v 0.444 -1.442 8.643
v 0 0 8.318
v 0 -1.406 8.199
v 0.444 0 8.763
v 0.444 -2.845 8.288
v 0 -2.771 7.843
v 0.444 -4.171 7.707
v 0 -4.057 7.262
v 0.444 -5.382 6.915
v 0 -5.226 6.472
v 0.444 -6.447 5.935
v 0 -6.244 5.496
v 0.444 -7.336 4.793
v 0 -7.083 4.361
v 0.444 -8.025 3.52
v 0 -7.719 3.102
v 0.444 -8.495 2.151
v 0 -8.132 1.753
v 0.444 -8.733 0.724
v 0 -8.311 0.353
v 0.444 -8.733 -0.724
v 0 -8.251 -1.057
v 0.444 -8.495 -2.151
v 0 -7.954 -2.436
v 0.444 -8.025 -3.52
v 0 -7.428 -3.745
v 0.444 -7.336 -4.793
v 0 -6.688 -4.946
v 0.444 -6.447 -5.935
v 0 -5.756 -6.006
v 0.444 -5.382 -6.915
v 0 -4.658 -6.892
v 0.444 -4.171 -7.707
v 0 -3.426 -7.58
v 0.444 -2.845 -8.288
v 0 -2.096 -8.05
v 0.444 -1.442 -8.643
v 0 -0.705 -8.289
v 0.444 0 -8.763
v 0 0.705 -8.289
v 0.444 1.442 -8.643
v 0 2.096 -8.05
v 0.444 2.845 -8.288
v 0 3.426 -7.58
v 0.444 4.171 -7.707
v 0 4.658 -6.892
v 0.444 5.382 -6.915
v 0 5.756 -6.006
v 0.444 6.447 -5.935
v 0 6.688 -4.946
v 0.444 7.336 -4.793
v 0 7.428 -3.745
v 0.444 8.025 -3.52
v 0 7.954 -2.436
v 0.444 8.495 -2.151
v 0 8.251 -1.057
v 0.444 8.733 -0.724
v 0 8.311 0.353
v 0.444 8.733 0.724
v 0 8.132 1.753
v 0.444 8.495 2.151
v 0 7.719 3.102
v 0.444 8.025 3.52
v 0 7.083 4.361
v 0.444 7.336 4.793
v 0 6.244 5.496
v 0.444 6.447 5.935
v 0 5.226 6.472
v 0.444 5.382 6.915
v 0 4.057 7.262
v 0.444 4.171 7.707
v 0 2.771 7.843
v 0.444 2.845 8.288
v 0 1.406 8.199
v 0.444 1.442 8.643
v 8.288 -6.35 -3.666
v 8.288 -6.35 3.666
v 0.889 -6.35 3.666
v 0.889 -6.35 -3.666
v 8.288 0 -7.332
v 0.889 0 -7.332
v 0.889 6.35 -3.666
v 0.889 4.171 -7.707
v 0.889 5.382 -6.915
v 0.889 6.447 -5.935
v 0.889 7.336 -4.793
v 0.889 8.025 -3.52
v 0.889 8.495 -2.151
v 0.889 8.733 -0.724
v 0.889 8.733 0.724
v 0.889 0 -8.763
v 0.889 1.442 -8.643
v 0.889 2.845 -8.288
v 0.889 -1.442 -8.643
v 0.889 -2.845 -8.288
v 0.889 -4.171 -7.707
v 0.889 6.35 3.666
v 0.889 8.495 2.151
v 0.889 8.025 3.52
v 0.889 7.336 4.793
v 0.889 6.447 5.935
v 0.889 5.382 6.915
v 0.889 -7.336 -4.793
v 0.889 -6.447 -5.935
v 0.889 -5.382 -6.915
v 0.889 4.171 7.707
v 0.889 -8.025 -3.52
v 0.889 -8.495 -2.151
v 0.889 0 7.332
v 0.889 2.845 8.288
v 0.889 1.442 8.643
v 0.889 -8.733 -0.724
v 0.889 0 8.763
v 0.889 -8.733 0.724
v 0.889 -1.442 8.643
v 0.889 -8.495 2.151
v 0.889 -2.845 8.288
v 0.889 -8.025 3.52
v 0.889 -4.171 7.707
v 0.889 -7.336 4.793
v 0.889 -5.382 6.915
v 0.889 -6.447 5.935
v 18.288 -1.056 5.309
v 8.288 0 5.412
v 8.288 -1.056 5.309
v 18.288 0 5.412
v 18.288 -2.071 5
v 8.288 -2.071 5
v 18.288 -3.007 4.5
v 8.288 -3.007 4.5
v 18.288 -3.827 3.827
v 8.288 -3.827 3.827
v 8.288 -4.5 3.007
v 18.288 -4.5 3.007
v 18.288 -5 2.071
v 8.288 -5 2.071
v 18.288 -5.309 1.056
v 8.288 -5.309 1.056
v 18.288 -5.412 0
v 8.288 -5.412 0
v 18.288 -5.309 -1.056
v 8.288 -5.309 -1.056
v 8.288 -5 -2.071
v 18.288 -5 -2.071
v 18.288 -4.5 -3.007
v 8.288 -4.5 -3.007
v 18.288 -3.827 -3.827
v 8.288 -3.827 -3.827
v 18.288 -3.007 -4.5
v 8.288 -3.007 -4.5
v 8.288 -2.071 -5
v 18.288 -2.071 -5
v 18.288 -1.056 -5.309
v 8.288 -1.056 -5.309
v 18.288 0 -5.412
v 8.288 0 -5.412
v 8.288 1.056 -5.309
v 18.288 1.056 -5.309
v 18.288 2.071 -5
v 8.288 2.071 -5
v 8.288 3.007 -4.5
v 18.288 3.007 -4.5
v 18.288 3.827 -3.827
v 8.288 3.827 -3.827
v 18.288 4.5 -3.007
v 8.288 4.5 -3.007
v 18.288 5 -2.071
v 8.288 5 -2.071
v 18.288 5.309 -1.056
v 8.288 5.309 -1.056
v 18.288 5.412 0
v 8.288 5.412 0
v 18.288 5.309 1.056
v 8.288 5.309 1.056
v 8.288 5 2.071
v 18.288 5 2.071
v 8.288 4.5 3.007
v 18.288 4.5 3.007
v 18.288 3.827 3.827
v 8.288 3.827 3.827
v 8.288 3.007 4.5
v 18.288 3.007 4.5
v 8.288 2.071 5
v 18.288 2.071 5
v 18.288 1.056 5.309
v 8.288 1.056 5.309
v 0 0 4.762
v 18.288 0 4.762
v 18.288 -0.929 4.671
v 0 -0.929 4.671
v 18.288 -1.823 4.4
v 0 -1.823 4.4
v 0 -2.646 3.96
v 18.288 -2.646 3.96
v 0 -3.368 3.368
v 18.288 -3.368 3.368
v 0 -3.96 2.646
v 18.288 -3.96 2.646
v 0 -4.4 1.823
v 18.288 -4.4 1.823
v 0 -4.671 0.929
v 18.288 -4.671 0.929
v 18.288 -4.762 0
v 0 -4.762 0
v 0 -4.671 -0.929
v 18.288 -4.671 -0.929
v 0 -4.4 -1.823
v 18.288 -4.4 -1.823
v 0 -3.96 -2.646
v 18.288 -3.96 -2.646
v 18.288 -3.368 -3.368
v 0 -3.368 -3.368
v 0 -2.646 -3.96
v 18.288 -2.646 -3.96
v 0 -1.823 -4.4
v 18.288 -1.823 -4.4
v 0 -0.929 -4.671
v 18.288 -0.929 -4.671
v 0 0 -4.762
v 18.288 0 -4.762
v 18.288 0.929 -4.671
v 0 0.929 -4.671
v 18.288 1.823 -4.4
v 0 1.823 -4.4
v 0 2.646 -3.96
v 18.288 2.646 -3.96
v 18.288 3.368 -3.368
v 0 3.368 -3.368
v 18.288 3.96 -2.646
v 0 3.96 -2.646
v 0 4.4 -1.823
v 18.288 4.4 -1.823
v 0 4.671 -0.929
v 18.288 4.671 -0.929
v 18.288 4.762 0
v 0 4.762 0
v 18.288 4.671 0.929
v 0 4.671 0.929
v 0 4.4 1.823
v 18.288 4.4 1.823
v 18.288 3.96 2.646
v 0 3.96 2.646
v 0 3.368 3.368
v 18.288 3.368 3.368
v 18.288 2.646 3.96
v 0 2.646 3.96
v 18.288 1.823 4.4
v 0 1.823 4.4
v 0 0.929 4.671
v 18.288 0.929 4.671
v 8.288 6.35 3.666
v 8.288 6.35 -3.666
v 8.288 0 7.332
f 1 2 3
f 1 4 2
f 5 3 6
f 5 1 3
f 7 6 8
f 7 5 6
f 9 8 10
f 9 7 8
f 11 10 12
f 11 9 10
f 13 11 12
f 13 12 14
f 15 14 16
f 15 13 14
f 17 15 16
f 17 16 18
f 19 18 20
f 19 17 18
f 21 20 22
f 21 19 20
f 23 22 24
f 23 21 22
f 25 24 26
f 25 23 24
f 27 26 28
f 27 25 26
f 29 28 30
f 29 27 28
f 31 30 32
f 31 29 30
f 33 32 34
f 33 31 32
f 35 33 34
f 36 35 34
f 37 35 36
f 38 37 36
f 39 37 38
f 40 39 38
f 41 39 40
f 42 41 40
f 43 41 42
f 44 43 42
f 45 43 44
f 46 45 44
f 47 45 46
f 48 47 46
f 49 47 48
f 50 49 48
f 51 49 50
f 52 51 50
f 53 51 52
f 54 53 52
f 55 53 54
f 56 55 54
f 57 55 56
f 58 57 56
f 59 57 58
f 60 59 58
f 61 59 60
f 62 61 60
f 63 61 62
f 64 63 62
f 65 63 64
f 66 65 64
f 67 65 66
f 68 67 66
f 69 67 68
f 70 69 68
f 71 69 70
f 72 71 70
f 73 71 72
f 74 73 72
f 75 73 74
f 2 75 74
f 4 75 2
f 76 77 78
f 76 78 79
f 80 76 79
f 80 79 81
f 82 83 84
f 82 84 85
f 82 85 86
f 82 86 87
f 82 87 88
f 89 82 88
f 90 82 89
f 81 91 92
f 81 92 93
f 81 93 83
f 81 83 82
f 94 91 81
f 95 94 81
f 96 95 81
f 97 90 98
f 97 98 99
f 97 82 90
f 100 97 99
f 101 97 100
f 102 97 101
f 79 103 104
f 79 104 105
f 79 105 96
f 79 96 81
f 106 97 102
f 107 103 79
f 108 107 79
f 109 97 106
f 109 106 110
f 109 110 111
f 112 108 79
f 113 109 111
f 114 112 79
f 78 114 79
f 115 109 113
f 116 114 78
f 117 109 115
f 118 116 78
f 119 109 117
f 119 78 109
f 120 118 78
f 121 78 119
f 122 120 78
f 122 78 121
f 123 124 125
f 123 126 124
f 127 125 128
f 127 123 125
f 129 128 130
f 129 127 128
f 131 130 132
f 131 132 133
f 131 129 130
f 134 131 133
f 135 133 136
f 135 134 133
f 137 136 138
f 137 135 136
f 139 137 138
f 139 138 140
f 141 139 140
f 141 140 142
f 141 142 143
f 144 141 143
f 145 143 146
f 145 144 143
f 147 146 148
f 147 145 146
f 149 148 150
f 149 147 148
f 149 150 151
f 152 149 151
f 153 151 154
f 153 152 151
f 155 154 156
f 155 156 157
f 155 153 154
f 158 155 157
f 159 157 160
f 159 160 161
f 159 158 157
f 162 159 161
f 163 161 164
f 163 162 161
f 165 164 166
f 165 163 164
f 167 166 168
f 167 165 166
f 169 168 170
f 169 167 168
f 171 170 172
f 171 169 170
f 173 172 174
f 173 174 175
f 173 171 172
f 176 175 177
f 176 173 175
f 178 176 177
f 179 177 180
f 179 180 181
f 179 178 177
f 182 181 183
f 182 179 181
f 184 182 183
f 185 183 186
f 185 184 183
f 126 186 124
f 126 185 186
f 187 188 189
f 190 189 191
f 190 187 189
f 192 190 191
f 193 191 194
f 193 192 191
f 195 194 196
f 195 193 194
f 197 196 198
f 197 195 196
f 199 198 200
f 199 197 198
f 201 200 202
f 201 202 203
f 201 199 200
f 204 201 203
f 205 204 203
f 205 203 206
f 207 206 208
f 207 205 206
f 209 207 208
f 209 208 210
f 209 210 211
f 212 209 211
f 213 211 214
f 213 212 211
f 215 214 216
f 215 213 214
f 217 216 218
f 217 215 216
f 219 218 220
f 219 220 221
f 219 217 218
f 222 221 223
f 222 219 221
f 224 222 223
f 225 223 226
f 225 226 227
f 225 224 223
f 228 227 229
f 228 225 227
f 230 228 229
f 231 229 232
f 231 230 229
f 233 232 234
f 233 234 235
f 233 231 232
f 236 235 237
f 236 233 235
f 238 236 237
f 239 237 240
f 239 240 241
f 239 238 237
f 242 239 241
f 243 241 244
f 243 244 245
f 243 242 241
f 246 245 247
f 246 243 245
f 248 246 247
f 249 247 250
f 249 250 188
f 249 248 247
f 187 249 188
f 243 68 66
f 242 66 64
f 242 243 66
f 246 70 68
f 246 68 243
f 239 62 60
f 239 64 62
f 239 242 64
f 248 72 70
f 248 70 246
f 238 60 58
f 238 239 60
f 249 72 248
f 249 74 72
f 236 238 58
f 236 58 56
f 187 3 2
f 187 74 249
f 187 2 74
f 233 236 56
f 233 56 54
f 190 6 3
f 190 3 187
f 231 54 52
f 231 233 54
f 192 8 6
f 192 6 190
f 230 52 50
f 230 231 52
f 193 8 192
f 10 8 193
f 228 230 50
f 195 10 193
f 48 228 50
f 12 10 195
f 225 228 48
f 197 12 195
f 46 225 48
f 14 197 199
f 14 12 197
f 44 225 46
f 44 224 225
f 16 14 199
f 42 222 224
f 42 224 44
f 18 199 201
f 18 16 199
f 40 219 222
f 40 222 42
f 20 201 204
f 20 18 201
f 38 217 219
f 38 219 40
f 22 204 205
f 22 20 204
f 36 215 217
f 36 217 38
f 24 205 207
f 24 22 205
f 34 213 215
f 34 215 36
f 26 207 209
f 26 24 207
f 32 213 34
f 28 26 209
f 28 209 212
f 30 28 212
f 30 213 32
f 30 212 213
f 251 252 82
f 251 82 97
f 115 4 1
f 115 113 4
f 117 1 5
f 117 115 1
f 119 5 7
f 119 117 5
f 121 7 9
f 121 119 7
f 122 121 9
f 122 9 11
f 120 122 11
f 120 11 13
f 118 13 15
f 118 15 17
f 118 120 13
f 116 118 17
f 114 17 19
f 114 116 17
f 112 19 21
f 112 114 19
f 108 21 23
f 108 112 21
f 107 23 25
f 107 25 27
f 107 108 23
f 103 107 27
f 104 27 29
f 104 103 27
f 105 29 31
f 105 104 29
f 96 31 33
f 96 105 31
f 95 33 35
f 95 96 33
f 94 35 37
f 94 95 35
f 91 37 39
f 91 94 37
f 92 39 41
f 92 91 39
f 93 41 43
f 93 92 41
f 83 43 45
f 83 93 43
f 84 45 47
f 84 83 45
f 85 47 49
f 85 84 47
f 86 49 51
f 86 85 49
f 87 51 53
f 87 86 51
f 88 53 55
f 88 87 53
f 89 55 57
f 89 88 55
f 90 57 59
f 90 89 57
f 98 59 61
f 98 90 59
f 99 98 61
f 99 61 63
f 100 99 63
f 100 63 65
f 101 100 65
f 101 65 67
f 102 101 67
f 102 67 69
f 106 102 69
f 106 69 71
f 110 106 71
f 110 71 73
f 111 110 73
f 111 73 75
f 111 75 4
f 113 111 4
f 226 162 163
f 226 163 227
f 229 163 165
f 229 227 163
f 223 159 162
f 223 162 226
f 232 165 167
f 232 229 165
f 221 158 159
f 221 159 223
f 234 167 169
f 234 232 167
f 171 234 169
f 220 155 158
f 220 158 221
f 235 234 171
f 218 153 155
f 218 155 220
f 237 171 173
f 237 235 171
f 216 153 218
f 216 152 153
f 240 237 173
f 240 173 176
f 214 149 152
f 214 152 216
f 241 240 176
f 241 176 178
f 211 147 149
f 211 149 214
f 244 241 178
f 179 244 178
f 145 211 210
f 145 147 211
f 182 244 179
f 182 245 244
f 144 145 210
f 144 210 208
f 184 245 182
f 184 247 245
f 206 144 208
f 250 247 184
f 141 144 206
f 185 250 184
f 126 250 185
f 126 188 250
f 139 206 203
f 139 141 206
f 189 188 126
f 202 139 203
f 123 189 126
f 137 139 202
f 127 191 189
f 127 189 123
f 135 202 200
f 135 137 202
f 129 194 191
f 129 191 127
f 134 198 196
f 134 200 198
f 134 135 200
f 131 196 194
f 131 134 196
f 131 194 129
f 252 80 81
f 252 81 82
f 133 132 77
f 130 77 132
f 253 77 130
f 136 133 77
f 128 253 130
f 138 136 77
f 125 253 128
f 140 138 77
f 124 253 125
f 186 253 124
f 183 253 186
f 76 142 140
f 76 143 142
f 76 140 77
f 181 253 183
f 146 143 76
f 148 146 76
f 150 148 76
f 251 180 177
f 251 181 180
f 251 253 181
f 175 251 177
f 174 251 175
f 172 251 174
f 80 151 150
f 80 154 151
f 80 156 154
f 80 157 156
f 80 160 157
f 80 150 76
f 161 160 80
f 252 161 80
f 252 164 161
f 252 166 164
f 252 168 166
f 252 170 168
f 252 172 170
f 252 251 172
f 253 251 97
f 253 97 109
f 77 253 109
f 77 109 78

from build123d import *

# Parameters (mm, degrees)
EXTRUDE1_START = 7.399
SKETCH2_R      = 5.4125
EXTRUDE1_DEPTH = 7.399


with BuildPart() as part:
    # Sketch1 → Revolve1 (revolve)
    with BuildSketch(Plane.XY, mode=Mode.PRIVATE) as revolve1_sk:
        Polygon((0, 4.7625), (0, 8.3185), (0.4445, 8.763), (0.889, 8.763), (0.889, 5.4125), (18.288, 5.4125), (18.288, 4.7625), align=None)
    revolve(revolve1_sk.sketch.rotate(Axis((0, 0, 0), (1, 0, 0)), 90), axis=Axis((0, 0, 0), (1, 0, 0)))

    # Sketch2 → Extrude1 (add)
    with BuildSketch(Plane(origin=(0.889, 0, 0), x_dir=(0, 0, -1), z_dir=(1, 0, 0)).offset(EXTRUDE1_START)):
        Polygon((7.332348419, 0), (3.666174209, 6.35), (-3.666174209, 6.35), (-7.332348419, 0), (-3.666174209, -6.35), (3.666174209, -6.35), align=None)
        with Locations(Location((0, 0, 0), (0, 0, 180))):
            Circle(SKETCH2_R, mode=Mode.SUBTRACT)
    extrude(amount=-EXTRUDE1_DEPTH)


solid = part.part
